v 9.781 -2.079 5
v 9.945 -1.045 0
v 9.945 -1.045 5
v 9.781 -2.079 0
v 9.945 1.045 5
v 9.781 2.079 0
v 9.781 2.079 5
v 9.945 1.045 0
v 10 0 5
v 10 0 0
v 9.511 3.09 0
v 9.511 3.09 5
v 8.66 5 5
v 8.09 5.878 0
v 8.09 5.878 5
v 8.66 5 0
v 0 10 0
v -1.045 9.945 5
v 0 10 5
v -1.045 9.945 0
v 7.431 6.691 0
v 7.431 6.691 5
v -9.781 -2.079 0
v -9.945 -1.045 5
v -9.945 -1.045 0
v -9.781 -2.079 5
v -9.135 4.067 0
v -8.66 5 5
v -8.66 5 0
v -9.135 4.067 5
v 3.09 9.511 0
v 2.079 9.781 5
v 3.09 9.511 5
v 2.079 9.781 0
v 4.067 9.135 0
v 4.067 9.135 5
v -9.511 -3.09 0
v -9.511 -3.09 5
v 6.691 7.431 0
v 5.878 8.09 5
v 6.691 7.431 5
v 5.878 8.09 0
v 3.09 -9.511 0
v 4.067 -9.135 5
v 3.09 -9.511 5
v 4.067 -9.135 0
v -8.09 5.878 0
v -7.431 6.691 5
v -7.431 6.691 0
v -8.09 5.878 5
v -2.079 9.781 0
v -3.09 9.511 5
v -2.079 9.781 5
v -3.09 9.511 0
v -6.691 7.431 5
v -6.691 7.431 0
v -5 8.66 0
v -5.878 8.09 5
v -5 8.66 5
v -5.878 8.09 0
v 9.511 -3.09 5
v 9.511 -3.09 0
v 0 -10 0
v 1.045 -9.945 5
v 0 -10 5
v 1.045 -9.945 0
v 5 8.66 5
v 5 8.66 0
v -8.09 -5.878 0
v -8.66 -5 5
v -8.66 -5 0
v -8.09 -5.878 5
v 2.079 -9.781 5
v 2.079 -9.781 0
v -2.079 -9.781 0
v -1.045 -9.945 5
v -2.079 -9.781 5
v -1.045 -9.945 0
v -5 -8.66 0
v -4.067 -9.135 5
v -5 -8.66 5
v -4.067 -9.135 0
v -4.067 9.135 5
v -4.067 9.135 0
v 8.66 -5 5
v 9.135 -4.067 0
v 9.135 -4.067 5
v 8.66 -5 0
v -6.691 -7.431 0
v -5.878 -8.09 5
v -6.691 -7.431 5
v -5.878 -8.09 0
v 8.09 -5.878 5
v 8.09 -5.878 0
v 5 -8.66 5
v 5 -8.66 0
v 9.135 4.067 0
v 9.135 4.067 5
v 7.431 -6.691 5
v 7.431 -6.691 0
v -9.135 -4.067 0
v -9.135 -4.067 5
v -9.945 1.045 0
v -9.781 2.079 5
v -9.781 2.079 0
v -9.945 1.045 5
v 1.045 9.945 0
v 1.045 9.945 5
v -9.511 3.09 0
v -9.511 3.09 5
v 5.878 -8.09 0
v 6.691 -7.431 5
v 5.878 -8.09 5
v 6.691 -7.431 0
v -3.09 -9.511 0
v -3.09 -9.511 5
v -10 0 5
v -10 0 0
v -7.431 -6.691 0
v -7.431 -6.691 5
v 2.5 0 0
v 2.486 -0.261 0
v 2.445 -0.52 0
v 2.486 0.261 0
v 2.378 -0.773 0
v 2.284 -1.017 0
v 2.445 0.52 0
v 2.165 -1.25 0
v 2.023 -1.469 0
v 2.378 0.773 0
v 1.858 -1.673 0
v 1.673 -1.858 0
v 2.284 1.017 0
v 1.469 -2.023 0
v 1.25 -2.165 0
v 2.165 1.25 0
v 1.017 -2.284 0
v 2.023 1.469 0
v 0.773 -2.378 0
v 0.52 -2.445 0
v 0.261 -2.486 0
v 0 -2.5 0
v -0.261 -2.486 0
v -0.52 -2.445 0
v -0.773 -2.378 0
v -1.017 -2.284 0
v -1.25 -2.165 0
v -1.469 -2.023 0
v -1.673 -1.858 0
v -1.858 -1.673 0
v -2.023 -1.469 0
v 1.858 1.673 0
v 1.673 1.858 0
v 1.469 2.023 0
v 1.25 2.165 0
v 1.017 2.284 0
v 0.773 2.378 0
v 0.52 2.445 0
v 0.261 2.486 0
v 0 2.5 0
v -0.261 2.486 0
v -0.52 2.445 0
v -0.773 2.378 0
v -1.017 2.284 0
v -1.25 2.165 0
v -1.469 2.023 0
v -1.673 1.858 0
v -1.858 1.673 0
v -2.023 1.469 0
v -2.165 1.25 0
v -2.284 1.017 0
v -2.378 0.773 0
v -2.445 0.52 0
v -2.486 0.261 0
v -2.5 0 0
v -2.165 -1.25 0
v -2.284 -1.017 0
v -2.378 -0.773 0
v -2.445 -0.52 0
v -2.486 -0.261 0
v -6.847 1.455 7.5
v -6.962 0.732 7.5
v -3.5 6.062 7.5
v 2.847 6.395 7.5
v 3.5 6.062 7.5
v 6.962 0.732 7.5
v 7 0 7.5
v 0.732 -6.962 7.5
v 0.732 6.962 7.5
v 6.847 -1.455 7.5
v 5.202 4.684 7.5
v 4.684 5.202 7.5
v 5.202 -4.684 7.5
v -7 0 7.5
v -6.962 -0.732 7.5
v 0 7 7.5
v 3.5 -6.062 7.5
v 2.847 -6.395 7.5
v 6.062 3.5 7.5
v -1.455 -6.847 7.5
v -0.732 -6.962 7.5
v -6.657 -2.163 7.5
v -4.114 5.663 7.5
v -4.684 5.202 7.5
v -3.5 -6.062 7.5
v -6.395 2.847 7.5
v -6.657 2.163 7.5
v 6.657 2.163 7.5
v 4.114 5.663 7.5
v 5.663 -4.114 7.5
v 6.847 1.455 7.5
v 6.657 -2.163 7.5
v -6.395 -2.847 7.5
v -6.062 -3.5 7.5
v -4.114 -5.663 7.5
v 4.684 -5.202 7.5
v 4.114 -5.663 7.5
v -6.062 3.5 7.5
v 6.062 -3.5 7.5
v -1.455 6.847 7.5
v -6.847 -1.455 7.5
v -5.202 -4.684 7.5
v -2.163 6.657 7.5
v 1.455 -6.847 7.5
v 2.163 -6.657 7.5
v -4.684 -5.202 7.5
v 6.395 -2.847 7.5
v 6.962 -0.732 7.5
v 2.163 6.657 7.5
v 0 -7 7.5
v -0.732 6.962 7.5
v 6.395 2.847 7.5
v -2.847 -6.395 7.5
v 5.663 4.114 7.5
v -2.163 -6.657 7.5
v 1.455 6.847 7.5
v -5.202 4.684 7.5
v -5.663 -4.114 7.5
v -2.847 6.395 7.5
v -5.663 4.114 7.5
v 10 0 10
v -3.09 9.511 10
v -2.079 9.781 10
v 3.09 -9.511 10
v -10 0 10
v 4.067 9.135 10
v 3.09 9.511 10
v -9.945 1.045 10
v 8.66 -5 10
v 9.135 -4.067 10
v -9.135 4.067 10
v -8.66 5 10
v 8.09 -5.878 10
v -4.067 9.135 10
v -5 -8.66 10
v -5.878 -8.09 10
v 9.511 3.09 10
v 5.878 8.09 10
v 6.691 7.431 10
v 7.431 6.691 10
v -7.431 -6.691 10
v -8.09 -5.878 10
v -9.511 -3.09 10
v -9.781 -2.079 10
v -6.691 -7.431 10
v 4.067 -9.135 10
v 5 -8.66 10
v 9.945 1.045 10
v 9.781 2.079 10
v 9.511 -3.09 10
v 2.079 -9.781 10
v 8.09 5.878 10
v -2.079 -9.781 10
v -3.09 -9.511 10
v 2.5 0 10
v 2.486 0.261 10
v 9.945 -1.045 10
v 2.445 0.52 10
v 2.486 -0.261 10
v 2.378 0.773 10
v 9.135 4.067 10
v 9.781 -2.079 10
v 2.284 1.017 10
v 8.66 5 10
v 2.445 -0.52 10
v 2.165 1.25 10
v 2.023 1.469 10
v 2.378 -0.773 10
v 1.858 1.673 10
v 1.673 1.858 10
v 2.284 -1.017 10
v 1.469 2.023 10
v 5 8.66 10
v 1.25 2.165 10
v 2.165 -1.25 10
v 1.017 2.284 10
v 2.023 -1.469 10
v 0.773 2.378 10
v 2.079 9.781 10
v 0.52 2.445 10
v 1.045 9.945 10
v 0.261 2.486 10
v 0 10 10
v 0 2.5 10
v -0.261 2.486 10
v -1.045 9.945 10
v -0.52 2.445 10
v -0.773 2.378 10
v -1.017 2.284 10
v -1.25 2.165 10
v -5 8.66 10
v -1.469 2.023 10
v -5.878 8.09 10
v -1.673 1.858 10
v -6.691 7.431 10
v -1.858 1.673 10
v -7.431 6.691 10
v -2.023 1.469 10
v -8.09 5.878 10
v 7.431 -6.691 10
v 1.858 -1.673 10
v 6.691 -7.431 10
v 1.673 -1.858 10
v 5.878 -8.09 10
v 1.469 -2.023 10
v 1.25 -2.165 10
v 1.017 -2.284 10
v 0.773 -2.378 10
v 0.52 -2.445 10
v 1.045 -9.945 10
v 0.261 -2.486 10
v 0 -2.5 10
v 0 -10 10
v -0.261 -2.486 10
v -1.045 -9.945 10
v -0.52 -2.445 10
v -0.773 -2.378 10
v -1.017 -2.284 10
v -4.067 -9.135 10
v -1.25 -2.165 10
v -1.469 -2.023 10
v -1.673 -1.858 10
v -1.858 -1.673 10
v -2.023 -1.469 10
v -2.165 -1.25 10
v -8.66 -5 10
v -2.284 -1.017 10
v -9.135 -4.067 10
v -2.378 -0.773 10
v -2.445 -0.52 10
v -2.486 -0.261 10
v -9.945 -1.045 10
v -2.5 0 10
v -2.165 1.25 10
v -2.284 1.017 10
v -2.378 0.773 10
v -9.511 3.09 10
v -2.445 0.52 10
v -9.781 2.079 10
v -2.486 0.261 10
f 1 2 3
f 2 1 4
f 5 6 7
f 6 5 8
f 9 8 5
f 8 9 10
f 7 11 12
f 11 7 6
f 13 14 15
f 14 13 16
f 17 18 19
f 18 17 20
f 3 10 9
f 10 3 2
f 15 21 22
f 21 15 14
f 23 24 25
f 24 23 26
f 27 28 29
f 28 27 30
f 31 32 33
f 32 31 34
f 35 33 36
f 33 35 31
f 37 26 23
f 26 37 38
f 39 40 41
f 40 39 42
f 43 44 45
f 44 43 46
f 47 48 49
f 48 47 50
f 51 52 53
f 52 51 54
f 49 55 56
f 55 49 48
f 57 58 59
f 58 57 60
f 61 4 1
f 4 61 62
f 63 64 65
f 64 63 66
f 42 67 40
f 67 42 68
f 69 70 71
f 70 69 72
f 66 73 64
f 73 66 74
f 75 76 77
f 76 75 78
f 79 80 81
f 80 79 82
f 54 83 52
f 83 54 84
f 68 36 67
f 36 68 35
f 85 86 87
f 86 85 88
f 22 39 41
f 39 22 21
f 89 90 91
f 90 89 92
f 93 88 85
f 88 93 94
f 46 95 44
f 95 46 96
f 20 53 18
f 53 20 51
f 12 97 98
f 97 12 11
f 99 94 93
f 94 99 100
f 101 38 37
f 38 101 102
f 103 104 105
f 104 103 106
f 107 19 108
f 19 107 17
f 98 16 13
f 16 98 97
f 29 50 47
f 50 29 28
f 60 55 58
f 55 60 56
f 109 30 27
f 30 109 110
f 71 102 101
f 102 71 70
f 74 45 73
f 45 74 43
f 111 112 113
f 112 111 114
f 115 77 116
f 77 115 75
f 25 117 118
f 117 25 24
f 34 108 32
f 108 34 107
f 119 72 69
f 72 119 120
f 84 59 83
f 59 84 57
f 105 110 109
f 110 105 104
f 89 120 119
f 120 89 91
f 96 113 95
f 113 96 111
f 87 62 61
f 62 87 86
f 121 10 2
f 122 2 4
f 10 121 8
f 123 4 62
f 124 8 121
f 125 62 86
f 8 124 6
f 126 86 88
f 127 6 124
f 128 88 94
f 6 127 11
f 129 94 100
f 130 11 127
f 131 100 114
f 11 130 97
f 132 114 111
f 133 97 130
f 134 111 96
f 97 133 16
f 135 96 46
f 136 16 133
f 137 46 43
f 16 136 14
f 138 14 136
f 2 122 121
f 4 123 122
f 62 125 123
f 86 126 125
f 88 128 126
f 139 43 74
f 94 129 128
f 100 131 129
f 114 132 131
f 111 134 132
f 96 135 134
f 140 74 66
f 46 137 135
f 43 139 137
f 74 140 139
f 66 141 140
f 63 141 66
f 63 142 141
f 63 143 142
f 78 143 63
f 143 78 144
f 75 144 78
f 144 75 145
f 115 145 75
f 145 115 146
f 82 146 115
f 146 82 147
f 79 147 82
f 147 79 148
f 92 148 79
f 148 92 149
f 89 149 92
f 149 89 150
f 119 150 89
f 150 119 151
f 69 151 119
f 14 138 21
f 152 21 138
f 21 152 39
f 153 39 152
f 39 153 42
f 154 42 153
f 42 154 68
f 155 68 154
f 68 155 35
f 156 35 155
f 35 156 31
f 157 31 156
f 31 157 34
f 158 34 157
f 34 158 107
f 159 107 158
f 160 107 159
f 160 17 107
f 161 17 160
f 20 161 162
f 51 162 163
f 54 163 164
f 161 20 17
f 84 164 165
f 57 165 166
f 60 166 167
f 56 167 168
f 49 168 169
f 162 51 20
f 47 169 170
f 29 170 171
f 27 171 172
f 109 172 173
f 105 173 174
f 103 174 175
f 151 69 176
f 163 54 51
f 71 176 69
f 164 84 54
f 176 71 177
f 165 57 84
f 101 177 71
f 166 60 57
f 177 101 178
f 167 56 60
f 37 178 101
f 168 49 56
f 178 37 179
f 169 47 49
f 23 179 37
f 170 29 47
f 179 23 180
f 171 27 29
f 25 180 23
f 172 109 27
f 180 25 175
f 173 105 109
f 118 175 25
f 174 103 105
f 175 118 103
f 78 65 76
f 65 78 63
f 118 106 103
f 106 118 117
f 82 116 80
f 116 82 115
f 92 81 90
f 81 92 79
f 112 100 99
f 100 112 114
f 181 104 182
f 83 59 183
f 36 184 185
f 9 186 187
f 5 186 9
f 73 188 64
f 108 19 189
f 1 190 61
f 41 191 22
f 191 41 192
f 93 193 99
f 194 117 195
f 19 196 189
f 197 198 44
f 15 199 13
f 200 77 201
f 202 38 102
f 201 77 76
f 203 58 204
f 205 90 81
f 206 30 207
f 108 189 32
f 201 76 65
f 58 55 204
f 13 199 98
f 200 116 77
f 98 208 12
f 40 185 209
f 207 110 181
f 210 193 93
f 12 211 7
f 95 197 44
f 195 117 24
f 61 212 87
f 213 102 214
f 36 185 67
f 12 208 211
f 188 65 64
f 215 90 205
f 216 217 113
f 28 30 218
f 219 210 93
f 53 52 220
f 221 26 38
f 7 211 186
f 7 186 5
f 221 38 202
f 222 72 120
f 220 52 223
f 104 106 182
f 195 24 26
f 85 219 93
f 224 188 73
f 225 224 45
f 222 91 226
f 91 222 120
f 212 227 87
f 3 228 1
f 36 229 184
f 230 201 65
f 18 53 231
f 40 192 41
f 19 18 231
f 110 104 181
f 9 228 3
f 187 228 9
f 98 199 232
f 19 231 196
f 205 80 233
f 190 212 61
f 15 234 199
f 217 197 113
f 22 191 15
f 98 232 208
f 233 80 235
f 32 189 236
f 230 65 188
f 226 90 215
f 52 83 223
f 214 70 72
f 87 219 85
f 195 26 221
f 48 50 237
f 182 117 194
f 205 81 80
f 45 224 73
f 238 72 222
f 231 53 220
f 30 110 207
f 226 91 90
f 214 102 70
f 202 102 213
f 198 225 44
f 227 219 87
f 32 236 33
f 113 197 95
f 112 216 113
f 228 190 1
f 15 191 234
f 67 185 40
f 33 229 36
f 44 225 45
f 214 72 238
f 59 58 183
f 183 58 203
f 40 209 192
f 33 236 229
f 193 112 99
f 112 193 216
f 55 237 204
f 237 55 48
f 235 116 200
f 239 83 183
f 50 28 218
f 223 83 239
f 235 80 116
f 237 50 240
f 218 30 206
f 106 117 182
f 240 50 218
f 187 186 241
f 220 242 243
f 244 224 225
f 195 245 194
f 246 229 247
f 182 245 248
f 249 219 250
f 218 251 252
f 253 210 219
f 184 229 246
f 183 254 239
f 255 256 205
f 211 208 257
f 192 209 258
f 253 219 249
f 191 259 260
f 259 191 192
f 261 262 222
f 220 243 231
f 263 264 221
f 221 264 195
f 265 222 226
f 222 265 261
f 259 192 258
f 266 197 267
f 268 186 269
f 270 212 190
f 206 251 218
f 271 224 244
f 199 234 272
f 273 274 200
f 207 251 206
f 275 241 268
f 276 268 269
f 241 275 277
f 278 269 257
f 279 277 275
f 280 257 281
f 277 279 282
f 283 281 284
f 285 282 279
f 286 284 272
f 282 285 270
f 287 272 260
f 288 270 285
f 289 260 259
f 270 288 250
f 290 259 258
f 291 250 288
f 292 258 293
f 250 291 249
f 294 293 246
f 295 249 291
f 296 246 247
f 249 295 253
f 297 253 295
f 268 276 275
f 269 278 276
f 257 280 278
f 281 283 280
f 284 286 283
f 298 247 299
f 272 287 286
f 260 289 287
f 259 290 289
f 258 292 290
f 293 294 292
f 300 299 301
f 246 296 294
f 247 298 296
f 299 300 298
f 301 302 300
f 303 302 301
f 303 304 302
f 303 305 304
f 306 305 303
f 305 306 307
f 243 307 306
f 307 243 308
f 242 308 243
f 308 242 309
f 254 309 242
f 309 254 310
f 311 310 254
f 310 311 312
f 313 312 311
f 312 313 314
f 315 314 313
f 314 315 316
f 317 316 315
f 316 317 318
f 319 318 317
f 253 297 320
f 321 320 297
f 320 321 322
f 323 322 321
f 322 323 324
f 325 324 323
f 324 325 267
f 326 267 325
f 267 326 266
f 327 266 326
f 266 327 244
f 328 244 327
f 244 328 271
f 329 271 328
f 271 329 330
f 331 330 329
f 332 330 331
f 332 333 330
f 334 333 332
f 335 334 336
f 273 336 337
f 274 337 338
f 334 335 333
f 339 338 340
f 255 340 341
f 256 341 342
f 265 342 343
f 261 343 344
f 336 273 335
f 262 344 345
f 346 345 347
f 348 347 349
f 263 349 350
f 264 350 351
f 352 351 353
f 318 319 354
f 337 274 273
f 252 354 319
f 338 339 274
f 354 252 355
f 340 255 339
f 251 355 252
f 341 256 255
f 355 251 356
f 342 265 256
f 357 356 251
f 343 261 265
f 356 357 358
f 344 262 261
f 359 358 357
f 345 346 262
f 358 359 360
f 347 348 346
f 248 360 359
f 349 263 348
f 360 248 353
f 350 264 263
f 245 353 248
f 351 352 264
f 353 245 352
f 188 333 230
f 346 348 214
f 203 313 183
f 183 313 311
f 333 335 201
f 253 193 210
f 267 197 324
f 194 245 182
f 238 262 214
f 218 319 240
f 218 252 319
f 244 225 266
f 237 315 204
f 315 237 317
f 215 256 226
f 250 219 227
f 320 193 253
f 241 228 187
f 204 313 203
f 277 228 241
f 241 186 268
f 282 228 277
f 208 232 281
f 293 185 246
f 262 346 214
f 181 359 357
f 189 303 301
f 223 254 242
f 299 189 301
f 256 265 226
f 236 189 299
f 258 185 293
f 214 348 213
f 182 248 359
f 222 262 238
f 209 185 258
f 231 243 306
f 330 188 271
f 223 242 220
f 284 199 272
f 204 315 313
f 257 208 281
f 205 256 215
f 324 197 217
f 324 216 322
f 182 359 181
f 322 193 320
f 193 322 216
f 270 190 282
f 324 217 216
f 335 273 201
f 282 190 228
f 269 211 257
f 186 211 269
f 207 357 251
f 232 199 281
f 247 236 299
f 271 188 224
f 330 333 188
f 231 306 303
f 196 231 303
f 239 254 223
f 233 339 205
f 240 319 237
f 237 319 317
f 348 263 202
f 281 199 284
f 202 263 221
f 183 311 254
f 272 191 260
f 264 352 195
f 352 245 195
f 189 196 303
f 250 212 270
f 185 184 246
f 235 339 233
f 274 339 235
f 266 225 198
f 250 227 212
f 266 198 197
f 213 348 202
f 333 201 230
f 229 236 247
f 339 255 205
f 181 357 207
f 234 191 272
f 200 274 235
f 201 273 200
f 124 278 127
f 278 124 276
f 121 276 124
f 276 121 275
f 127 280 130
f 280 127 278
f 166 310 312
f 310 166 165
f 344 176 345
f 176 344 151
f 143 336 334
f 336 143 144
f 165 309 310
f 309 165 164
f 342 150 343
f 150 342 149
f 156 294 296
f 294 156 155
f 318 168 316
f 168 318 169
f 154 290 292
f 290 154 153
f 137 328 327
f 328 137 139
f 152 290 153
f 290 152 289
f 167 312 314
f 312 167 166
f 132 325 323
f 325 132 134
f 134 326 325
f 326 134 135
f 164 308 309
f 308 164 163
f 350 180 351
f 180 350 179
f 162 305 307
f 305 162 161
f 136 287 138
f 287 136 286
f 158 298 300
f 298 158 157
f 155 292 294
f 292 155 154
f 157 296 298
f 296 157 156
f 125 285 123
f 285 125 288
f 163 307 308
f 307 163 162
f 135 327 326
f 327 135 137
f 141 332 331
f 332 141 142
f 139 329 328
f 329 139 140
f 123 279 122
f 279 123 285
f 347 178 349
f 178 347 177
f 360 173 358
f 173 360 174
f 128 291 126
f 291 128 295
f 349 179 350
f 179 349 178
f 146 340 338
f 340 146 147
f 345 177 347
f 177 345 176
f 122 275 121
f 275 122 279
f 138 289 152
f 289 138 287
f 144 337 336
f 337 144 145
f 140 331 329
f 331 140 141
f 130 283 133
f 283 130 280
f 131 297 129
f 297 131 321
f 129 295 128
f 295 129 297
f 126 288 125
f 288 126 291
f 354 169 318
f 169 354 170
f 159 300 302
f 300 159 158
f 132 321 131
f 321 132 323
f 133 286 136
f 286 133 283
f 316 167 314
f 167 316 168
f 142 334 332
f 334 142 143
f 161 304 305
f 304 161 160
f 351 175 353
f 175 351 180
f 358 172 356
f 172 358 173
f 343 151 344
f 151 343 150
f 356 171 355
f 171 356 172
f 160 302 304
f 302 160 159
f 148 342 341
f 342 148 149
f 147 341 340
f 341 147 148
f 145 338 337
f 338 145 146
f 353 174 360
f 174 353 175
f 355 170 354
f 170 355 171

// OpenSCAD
// V-groove guide wheel.
$fn = 60;
eps = 0.02;
bore_d = 5;
outer_d = 20;
width = 10;
groove_d = outer_d-6;
difference() {
    union() { cylinder(d=outer_d,h=width/2); translate([0,0,width/2]) cylinder(d1=outer_d,d2=groove_d,h=width/4); translate([0,0,3*width/4]) cylinder(d1=groove_d,d2=outer_d,h=width/4); }
    translate([0,0,-eps]) cylinder(d=bore_d,h=width+2*eps);
}
